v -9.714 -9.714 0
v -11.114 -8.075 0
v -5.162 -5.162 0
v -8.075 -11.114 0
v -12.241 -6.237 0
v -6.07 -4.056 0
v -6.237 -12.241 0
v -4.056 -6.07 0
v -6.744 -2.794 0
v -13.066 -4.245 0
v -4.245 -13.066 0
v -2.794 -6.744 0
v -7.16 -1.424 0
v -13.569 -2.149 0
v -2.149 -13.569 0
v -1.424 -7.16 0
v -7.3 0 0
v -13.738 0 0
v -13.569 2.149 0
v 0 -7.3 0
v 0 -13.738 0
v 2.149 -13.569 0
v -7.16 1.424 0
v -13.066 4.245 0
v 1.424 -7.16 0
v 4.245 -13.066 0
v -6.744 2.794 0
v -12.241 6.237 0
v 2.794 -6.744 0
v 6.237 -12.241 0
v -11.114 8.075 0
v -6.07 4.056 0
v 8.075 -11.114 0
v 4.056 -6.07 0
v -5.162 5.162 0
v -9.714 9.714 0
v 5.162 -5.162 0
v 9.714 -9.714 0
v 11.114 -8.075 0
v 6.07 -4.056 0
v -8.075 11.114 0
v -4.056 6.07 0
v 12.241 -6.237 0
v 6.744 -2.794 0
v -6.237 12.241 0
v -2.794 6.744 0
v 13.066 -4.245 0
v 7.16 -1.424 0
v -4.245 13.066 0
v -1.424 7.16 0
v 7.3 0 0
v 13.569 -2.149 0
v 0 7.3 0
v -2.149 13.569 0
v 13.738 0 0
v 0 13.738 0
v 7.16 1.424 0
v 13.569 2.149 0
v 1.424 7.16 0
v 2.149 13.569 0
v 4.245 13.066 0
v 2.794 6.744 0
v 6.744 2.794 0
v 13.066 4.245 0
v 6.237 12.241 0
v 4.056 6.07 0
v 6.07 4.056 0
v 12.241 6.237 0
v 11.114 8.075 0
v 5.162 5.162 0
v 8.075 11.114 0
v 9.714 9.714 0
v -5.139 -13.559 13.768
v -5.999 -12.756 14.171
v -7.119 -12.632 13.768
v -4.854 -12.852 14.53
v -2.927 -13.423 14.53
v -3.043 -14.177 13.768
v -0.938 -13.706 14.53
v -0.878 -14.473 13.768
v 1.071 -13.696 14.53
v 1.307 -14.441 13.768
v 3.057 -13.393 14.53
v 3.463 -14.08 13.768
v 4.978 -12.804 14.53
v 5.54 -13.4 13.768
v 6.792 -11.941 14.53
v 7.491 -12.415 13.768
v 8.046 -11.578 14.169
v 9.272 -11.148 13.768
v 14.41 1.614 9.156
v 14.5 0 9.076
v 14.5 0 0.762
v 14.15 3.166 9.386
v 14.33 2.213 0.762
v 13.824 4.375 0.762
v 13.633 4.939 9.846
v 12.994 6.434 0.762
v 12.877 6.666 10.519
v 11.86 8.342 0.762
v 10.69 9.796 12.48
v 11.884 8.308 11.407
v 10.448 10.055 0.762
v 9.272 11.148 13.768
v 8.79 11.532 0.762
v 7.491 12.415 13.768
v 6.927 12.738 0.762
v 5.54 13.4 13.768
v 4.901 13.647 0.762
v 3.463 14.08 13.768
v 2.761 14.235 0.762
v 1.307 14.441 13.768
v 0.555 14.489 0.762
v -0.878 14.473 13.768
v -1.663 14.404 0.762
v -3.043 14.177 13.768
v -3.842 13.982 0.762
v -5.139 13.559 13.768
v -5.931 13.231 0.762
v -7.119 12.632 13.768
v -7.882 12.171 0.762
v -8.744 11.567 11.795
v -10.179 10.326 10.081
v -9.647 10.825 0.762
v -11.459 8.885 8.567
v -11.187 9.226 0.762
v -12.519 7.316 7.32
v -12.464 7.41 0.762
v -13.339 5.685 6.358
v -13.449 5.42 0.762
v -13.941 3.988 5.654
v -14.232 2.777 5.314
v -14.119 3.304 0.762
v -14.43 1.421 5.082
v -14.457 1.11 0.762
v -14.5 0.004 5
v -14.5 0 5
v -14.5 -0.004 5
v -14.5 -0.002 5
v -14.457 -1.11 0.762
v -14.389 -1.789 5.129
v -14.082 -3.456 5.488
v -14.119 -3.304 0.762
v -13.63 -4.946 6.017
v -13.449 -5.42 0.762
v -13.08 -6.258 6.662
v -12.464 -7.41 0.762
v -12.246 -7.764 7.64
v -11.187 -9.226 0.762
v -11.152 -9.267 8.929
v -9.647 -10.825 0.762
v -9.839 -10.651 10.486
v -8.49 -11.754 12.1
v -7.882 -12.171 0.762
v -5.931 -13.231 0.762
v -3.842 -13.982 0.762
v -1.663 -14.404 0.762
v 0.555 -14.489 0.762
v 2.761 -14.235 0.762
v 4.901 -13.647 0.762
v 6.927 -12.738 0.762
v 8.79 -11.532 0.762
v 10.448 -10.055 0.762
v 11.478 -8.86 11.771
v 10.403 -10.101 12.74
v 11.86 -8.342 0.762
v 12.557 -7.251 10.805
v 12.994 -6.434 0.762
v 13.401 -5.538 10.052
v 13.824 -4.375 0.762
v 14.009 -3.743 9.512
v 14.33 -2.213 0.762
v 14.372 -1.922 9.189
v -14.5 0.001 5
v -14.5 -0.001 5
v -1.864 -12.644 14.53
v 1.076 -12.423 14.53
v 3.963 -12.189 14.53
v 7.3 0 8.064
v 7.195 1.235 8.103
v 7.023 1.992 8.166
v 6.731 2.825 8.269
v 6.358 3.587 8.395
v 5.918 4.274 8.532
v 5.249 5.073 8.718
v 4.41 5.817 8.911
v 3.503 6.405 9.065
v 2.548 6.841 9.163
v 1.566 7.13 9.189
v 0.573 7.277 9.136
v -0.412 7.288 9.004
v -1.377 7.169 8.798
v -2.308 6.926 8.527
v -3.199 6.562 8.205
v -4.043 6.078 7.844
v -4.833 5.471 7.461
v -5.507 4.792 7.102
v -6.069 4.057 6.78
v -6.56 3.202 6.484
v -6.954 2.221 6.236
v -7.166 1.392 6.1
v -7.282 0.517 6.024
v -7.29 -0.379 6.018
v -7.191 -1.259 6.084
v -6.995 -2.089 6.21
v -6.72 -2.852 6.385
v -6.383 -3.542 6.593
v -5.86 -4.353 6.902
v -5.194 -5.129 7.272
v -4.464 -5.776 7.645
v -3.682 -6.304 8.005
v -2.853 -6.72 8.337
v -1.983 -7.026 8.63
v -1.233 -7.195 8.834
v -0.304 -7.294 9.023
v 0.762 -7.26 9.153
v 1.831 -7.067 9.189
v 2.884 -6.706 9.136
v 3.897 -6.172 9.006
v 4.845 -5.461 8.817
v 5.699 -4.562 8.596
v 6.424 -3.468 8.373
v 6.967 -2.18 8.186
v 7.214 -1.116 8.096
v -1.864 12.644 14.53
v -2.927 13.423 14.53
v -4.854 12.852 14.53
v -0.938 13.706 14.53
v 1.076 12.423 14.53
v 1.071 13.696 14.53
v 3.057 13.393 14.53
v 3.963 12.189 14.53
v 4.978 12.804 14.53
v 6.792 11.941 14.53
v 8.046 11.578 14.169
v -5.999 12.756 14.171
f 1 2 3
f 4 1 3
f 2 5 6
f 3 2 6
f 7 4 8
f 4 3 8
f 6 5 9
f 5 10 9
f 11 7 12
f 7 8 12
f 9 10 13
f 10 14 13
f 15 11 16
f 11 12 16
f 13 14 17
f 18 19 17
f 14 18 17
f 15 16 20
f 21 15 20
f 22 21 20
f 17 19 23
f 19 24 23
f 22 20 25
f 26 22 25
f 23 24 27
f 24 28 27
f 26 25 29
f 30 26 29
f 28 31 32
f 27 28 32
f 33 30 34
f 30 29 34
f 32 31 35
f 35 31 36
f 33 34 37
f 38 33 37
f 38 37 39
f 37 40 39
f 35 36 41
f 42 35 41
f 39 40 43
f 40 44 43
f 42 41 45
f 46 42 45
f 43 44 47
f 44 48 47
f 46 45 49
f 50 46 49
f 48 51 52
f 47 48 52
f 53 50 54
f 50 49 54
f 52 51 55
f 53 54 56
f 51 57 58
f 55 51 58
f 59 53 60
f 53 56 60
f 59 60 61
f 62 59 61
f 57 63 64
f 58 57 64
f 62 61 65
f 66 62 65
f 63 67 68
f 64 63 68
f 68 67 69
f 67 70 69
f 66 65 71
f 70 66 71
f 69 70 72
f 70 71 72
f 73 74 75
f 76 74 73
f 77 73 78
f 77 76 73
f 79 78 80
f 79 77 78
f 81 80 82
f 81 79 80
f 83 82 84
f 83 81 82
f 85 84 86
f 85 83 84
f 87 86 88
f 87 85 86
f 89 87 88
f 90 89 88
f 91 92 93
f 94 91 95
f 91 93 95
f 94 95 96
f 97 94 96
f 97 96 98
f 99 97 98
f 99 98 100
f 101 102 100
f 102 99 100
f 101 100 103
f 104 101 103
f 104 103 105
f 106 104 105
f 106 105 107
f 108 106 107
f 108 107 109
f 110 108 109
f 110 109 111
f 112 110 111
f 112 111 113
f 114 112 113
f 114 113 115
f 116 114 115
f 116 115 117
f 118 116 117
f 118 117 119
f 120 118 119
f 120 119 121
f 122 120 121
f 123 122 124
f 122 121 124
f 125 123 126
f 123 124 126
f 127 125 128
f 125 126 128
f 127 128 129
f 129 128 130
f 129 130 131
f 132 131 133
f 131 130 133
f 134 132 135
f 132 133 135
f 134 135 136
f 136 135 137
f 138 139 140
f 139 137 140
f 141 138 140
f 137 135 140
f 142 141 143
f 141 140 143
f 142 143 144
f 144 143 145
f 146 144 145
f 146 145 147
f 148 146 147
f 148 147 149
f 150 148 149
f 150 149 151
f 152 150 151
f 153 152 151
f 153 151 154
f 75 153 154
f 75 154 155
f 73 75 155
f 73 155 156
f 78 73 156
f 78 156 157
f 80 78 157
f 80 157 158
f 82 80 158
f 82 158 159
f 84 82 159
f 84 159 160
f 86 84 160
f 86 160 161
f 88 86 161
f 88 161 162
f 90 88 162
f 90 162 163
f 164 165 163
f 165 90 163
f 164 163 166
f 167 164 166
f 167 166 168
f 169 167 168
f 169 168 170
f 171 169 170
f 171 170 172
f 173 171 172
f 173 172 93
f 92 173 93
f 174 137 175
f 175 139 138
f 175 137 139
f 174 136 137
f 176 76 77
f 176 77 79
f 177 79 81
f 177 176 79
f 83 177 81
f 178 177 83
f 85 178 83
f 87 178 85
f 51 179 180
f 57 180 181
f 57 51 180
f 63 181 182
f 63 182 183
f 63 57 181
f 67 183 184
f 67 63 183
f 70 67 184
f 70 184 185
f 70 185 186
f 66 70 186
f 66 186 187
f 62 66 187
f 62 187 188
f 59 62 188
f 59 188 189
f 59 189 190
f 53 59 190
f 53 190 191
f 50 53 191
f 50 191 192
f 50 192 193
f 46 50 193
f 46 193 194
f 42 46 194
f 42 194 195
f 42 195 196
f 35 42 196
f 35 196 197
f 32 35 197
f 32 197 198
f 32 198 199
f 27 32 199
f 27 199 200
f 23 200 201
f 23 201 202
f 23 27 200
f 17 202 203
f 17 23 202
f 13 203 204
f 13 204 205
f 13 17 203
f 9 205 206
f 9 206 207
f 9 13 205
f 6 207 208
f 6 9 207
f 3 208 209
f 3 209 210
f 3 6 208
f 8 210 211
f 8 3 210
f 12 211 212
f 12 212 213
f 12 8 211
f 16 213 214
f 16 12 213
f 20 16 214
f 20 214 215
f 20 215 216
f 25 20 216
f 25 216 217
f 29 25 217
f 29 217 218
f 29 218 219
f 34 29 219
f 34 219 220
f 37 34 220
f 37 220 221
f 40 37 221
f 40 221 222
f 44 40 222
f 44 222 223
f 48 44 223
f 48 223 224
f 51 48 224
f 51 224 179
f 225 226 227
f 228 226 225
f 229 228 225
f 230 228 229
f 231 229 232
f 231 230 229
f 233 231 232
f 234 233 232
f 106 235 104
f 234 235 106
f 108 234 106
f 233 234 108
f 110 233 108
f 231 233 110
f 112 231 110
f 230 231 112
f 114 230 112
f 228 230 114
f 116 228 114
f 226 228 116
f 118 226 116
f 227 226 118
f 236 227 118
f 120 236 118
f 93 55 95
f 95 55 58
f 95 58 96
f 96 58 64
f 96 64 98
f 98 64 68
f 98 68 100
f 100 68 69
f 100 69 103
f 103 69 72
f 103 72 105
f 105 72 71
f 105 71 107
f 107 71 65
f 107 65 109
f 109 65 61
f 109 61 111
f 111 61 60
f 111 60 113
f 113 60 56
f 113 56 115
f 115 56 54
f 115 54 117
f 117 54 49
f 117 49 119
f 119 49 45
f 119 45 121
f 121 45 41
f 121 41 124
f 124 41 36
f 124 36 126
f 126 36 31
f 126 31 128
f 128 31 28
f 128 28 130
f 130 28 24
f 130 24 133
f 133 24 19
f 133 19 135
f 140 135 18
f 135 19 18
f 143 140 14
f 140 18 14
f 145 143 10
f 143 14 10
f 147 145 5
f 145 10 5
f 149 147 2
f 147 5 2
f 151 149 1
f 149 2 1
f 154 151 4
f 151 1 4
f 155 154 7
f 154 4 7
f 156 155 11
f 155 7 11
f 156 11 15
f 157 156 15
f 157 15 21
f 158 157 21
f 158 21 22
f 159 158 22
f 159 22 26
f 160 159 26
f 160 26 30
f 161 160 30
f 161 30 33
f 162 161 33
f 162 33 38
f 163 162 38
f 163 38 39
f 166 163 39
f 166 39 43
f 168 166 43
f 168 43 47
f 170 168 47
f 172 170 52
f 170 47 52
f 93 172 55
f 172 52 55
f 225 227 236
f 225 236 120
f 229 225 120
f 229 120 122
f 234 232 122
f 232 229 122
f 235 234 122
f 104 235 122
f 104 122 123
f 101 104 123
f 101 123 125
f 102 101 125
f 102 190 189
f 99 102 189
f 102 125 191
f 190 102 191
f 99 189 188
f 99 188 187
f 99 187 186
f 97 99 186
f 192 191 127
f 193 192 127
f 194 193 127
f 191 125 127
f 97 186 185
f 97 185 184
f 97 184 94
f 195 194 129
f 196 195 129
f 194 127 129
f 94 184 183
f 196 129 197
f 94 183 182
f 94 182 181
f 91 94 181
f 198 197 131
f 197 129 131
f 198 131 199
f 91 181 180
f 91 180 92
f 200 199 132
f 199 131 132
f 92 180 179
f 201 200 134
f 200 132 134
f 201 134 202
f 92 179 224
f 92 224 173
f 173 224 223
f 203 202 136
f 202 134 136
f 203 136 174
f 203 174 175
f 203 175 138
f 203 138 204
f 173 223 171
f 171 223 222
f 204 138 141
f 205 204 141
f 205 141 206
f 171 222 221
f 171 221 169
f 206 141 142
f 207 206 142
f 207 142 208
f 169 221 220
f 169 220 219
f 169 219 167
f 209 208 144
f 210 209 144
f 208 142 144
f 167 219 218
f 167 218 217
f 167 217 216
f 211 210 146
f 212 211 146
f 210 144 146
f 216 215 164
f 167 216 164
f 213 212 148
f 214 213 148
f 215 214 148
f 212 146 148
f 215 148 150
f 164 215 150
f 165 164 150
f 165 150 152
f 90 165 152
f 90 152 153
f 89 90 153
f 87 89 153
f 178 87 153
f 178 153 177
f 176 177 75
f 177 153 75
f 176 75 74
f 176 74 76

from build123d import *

# Parameters (mm, degrees)
F0_R     = 14.5
F0_R_2   = 7.3
F1_DEPTH = 14.53
F4_SIZE  = 0.762
F5_R     = 14.25
F6_DEPTH = 127


with BuildPart() as f1:
    # F0 (on Top) → F1 (new body)
    with BuildSketch(Plane.XY):
        Circle(F0_R)
        Circle(F0_R_2, mode=Mode.SUBTRACT)
    extrude(amount=F1_DEPTH)

    # F4
    f4_edges = [f1.edges().sort_by_distance(p)[0] for p in [
        (-14.5, 0, 14.53),
        (-14.5, 0, 0),
    ]]
    chamfer(f4_edges, length=F4_SIZE)

    # F5 (on face) → F6 (cut)
    with BuildSketch(Plane(origin=(-13.530054, 0, -1.901525), x_dir=(0, -1, 0), z_dir=(-0.990268, 0, -0.139173))):
        with Locations((0, 21.21935)):
            Circle(F5_R)
    extrude(amount=-F6_DEPTH, mode=Mode.SUBTRACT)


solid = f1.part
